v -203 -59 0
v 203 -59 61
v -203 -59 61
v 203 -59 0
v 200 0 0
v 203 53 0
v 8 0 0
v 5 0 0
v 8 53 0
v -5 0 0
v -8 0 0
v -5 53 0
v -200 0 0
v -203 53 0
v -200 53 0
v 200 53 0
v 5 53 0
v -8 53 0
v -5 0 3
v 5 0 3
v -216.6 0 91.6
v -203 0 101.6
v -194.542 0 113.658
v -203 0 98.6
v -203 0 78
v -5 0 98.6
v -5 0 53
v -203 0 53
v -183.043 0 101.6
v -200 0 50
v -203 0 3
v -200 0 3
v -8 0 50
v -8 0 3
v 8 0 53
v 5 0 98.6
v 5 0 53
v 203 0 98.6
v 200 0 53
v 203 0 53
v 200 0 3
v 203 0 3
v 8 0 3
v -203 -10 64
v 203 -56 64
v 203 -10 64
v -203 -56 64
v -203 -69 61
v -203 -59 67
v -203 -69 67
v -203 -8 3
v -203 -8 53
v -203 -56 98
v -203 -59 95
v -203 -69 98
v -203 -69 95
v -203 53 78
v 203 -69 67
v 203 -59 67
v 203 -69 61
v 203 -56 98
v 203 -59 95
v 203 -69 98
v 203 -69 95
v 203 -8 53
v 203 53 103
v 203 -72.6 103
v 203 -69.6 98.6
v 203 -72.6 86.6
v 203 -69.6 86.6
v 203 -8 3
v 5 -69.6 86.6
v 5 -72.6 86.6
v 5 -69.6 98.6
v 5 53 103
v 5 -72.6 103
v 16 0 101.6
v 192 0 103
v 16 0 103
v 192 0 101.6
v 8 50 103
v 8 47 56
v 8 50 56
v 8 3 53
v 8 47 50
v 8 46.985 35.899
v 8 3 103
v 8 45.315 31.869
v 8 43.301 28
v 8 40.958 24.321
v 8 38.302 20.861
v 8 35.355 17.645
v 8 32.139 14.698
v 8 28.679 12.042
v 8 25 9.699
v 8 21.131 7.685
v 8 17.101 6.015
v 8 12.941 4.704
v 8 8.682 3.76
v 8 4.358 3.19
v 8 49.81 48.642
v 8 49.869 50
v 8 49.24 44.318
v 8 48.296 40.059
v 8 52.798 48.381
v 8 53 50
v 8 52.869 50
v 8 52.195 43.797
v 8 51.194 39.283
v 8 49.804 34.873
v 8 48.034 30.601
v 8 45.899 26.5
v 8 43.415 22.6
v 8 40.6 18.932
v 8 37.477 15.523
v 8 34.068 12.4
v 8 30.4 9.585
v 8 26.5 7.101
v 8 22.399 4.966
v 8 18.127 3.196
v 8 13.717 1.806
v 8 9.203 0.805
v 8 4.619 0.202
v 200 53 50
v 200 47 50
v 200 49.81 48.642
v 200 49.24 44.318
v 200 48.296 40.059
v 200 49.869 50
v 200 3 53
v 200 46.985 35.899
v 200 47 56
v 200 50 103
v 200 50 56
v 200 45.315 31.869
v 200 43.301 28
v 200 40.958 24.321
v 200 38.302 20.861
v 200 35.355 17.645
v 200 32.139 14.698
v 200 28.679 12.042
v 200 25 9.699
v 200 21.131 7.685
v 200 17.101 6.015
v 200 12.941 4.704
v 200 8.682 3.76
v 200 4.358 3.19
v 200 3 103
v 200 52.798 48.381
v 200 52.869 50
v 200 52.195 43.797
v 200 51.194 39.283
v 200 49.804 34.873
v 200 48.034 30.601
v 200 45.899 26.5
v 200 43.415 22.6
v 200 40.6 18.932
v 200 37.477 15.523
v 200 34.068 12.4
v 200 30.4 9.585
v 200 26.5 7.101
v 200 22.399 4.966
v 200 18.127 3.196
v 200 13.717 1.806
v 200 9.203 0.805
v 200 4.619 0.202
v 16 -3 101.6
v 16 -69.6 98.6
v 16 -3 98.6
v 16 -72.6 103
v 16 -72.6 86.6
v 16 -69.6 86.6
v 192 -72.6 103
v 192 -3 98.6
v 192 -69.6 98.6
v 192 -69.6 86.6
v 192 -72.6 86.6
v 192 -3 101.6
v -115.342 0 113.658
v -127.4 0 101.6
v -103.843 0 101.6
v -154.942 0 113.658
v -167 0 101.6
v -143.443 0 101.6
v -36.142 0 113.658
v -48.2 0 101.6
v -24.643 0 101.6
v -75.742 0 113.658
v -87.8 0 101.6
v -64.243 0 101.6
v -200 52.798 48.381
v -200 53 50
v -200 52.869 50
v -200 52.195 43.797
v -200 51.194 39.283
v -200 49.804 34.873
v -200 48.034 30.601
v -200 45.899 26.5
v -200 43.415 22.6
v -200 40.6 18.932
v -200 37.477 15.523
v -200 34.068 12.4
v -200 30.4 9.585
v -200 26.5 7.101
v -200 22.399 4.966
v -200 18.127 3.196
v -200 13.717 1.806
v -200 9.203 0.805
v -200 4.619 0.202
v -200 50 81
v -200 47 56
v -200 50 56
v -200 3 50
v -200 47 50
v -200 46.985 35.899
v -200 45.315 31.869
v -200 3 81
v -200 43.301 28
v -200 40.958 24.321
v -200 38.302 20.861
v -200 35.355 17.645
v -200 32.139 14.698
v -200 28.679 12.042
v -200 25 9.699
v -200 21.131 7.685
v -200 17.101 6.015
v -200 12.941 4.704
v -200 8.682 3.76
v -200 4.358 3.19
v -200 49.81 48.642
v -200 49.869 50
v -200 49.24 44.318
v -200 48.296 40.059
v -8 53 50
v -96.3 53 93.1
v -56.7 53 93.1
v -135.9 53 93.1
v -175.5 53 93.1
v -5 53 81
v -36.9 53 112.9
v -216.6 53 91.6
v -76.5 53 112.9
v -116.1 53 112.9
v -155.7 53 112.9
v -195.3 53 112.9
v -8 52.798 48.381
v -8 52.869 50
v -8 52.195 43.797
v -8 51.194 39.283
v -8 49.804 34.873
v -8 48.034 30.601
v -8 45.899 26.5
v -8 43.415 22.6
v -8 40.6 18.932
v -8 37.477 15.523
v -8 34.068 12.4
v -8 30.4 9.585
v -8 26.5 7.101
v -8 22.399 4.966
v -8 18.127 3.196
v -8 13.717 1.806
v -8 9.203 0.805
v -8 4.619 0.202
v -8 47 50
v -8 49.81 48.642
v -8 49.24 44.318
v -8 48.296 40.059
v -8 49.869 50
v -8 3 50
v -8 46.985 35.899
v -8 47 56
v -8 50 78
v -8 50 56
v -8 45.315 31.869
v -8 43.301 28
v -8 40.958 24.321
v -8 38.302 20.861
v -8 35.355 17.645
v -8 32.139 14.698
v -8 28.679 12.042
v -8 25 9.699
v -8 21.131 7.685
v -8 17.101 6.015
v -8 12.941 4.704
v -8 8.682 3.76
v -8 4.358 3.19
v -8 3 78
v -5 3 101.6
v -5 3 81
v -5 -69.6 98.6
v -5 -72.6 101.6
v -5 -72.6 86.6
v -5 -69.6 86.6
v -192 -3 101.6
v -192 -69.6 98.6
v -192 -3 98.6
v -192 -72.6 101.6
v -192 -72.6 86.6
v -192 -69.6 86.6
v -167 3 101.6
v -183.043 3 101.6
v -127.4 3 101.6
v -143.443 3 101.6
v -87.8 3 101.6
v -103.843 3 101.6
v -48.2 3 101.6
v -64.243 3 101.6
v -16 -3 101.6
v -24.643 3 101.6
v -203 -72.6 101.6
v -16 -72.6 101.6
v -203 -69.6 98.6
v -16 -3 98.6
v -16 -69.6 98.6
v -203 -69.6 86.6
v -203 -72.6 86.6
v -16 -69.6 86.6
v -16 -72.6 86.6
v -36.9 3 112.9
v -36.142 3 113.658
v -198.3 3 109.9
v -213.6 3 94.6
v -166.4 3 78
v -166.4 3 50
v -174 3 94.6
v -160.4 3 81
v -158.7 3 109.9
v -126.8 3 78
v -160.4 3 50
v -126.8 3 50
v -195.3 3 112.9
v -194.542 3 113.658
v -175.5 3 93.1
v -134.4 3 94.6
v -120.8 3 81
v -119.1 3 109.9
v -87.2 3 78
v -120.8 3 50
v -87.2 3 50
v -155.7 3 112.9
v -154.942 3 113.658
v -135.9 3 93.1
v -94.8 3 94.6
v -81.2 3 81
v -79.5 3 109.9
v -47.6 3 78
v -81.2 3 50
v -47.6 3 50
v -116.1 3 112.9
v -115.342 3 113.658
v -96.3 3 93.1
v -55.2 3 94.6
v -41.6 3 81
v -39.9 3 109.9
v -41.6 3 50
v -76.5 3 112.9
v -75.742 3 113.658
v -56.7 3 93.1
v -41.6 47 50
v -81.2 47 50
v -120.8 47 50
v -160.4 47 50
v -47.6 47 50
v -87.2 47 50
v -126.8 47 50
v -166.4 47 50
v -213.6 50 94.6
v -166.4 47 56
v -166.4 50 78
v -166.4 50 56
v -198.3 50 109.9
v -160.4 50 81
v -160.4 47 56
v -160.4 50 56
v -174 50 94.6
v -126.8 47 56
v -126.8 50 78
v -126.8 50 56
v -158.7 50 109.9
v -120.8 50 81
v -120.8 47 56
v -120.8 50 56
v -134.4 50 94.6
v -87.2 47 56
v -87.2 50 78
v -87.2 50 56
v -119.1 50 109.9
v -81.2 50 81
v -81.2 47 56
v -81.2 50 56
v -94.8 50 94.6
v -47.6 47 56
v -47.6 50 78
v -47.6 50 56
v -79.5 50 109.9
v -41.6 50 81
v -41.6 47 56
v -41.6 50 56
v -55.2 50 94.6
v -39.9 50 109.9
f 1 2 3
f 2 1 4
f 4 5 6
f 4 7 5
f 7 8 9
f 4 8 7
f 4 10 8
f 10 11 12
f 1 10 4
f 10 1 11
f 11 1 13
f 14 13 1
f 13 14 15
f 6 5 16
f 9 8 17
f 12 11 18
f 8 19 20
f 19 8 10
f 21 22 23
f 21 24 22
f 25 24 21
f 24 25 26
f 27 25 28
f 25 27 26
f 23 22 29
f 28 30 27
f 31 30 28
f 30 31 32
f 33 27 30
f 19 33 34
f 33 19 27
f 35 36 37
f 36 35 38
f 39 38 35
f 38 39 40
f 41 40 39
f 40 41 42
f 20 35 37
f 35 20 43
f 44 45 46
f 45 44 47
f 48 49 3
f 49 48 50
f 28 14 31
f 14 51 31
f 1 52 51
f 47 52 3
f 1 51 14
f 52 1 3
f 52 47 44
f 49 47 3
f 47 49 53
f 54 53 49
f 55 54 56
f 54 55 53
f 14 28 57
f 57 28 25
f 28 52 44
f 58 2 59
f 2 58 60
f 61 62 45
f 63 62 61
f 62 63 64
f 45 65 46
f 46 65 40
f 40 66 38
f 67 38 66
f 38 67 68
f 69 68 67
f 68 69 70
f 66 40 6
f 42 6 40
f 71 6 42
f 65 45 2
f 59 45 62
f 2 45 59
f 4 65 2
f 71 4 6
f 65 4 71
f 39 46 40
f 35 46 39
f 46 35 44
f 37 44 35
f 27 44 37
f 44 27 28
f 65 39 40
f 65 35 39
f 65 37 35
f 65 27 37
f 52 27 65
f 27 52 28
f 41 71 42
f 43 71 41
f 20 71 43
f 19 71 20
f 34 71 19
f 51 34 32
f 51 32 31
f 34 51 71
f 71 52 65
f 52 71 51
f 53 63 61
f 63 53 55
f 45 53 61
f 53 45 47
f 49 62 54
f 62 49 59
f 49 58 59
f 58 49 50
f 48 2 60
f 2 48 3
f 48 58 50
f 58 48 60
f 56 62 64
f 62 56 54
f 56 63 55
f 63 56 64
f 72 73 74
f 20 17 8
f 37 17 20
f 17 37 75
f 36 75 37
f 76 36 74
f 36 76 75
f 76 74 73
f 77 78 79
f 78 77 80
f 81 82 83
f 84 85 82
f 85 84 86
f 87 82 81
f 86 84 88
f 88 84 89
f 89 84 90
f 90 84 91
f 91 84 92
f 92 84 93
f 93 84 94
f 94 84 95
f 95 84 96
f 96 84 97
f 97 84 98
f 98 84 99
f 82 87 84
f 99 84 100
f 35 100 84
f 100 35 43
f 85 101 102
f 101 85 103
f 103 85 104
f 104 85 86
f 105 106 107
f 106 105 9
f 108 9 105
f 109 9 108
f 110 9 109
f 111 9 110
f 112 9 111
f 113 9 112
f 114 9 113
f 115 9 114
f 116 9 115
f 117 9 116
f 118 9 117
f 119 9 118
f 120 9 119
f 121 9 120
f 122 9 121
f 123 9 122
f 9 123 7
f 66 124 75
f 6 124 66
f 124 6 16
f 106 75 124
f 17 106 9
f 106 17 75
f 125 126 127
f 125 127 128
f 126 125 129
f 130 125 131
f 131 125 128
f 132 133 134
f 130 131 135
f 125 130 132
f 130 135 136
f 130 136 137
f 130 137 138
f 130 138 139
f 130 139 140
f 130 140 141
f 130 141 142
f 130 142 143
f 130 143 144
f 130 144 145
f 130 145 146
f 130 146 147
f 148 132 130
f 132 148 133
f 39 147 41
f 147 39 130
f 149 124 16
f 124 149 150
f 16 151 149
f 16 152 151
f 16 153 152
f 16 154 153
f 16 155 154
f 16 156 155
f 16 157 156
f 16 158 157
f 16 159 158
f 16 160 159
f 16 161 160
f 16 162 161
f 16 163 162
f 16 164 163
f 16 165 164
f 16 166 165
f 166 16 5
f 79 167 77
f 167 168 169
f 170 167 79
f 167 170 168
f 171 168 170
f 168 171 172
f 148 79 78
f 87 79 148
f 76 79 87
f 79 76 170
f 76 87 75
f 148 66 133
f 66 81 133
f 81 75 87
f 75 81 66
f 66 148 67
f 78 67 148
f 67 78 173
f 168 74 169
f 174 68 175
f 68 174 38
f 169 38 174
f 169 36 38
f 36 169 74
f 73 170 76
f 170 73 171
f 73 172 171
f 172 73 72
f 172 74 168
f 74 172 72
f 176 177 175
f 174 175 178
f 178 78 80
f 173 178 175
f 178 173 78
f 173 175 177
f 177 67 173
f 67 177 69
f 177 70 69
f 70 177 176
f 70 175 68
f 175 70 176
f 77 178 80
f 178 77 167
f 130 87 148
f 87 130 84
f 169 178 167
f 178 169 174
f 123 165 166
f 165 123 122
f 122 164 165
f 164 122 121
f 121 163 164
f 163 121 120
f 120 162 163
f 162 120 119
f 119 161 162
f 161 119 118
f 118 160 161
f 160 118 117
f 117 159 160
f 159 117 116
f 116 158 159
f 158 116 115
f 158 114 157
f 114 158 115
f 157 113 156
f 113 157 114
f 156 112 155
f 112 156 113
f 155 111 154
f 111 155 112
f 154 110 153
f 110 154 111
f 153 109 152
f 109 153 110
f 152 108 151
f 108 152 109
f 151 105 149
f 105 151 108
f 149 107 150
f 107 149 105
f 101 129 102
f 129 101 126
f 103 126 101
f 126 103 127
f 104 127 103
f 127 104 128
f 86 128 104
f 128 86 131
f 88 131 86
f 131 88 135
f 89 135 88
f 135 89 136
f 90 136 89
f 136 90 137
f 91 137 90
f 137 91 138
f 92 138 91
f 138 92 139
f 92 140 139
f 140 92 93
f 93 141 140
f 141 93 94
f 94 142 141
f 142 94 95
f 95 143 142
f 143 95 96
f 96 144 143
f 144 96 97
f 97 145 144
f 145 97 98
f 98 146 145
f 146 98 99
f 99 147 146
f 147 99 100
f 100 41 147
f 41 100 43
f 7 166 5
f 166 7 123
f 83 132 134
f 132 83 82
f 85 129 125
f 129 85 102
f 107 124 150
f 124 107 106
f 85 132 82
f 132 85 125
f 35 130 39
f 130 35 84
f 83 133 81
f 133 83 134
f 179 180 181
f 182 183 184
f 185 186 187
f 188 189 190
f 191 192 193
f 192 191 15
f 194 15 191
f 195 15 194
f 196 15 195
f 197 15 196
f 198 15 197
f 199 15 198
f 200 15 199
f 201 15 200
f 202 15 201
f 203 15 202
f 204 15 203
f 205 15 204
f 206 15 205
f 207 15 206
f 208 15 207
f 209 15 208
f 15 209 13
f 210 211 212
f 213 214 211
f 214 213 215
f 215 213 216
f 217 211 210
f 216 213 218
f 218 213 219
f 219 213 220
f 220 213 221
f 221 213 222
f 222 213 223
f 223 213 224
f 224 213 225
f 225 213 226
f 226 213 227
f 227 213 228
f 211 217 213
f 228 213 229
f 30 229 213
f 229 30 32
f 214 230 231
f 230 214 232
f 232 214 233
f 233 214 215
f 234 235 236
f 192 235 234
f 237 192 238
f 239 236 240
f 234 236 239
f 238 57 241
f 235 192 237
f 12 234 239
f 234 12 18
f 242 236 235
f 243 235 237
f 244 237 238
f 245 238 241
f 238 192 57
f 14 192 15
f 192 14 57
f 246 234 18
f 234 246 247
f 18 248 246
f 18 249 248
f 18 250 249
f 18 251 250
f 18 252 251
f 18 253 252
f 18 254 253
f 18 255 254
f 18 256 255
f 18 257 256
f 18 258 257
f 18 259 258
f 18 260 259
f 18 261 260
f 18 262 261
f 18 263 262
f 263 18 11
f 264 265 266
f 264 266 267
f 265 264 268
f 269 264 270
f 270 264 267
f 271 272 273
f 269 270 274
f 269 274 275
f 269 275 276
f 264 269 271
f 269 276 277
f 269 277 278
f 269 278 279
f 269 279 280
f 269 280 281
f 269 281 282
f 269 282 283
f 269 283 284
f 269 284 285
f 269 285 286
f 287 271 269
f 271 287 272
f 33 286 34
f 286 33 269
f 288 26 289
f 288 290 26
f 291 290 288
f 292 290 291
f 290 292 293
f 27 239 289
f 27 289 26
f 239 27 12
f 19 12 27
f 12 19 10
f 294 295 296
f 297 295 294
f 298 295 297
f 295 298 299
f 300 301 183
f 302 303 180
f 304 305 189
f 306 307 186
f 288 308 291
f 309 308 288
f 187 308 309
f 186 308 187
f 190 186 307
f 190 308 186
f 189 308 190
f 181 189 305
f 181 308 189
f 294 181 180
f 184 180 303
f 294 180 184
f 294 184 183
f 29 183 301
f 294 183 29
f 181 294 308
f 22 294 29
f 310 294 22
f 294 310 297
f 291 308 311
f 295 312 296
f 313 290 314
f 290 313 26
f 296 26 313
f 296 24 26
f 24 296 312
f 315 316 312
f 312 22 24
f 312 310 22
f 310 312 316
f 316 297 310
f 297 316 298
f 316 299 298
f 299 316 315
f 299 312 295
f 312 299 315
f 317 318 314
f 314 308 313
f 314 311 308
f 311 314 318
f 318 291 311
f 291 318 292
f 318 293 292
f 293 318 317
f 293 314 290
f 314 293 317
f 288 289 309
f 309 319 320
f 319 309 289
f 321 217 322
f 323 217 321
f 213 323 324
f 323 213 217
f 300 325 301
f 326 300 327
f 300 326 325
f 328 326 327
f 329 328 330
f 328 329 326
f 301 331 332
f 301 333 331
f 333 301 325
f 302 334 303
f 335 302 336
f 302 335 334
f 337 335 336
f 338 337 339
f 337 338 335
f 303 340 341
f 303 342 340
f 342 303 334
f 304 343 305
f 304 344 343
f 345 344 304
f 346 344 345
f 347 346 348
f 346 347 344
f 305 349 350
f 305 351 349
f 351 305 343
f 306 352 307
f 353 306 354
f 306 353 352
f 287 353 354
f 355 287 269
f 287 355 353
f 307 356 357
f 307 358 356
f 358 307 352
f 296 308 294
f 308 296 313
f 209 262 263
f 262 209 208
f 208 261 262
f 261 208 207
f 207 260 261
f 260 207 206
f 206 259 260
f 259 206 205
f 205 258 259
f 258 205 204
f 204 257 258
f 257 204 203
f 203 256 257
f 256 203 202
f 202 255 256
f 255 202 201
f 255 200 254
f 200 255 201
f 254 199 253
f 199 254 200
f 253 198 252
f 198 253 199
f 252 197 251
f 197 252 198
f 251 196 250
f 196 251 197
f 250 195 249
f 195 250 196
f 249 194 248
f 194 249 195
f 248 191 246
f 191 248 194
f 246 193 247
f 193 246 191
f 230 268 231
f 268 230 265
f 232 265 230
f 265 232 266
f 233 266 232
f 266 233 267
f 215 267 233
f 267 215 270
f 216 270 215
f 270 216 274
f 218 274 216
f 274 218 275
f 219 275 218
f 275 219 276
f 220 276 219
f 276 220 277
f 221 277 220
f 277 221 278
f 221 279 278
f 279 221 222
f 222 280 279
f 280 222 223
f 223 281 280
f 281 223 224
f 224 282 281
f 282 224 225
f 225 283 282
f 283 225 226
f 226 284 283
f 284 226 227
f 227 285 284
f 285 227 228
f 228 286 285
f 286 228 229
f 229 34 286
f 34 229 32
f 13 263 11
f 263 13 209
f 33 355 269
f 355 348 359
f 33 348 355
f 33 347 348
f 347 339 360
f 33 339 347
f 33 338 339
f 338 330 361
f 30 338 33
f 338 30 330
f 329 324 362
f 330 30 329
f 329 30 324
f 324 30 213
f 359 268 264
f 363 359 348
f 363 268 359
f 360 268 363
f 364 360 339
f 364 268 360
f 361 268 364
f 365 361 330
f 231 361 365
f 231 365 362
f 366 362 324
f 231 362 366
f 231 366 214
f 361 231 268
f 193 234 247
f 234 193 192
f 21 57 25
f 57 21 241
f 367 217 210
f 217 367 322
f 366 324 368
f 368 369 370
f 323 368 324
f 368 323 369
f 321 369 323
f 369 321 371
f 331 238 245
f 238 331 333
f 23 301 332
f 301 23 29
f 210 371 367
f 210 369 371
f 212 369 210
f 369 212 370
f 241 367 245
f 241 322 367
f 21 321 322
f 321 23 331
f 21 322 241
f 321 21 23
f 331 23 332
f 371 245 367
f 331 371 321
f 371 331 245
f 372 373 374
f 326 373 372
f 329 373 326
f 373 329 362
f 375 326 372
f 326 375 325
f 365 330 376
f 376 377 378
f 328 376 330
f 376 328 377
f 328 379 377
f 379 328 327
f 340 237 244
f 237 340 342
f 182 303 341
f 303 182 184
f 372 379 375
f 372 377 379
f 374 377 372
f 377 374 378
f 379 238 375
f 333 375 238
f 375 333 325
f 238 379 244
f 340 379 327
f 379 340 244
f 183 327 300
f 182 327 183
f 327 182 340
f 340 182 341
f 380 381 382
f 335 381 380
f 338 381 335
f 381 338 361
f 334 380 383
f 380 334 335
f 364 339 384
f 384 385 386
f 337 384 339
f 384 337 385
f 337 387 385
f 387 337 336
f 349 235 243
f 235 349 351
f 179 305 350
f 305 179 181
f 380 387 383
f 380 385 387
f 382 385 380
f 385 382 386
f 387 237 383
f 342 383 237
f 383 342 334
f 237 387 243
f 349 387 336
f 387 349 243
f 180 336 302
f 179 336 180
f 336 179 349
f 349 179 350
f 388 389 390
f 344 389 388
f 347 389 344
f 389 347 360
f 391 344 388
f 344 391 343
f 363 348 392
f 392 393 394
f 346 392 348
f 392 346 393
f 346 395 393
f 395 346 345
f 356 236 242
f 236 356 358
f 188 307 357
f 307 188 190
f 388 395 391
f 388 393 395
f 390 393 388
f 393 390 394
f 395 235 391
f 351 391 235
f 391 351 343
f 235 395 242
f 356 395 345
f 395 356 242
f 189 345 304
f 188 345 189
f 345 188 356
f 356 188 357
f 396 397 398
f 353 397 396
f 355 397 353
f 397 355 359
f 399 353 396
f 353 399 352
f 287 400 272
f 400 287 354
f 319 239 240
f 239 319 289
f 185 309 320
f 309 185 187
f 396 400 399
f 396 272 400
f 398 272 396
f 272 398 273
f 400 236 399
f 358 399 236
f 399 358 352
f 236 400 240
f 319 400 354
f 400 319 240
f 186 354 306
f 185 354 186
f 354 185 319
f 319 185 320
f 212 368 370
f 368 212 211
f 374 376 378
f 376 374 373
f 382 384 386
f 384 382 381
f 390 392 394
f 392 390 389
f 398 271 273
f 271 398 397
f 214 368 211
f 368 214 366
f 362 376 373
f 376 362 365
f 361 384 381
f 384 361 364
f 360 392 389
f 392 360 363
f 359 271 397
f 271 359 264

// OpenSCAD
// file: parts/ac_vent_rail_mockup.scad
// Reference-only mockup of the measured AC vent, top ledge, and mounting rail.
// This artifact is an interface/checking aid, not a replacement appliance part.

module _validate_ac_mockup_parameters() {
  assert(
    mockup_vent_width > 0,
    "Mockup vent width must be positive."
  );
  assert(
    mockup_clear_outlet_height > 0
      && mockup_clear_outlet_height
        < ac_inlet_lower_datum_to_rail_base,
    "Clear outlet must fit below the measured AC top datum."
  );
  assert(
    mockup_vent_face_to_rail_front
      >= mockup_outlet_recess_depth + rail_depth,
    "Measured ledge depth cannot contain the outlet recess and rail."
  );
  assert(
    mockup_casing_skin >= minimum_wall_thickness,
    "Mockup casing skin is below the structural modeling minimum."
  );
  assert(
    rail_thickness >= minimum_wall_thickness,
    "Mockup rail thickness is below the structural modeling minimum."
  );
}

module _mockup_casing() {
  lower_datum_z = 0;
  outlet_bottom_z = wall_thickness;
  outlet_top_z =
    outlet_bottom_z + mockup_clear_outlet_height;
  casing_top_z = ac_inlet_lower_datum_to_rail_base;
  back_y =
    -mockup_vent_face_to_rail_front
    - rail_thickness;

  difference() {
    // The sloped upper face approximates the photographed molded outlet hood.
    rotate([0, -90, 0])
      linear_extrude(
        height = mockup_vent_width,
        center = true,
        convexity = 10
      )
        polygon(points = [
          [lower_datum_z, back_y],
          [lower_datum_z, 0],
          [outlet_top_z, 0],
          [casing_top_z, -10],
          [casing_top_z, back_y]
        ]);

    // Shallow open-front recess marks the measured 406 x 50 mm airflow area.
    translate([
      -mockup_vent_width / 2 - 1,
      -mockup_outlet_recess_depth,
      outlet_bottom_z
    ])
      cube([
        mockup_vent_width + 2,
        mockup_outlet_recess_depth + 1,
        mockup_clear_outlet_height
      ]);
  }
}

module _mockup_rail() {
  rail_front_y = -mockup_vent_face_to_rail_front;
  rail_base_z = ac_inlet_lower_datum_to_rail_base;

  union() {
    // Vertical flange.
    translate([
      -mockup_vent_width / 2,
      rail_front_y - rail_thickness,
      rail_base_z
    ])
      cube([
        mockup_vent_width,
        rail_thickness,
        rail_flange_height
      ]);

    // Lower mounting foot and upper rolled-lip envelope extend rearward,
    // toward the wood side of the installation. The 10 mm depths are
    // assumptions retained from the original prompt, not direct photo reads.
    translate([
      -mockup_vent_width / 2,
      rail_front_y
        - mockup_rail_lip_depth
        - rail_thickness,
      rail_base_z - rail_thickness
    ])
      cube([
        mockup_vent_width,
        mockup_rail_lip_depth + rail_thickness,
        2 * rail_thickness
      ]);

    translate([
      -mockup_vent_width / 2,
      rail_front_y
        - mockup_rail_lip_depth
        - rail_thickness,
      rail_top_z - rail_thickness
    ])
      cube([
        mockup_vent_width,
        mockup_rail_lip_depth + rail_thickness,
        rail_thickness
      ]);
  }
}

module ac_vent_rail_mockup() {
  _validate_ac_mockup_parameters();

  union() {
    _mockup_casing();
    _mockup_rail();
  }
}
// file: lib/defaults.scad
// AC redirector prototype defaults, revision 0001 (all dimensions in mm).
//
// Installed coordinate convention:
// - x: across the AC outlet; positive x is the provisional bedward yaw direction
// - y: forward, away from the AC face
// - z: upward from the bottom tangent of the scoop

minimum_wall_thickness = 3.0;
minimum_structural_overlap = minimum_wall_thickness;
minimum_internal_edge_width = minimum_wall_thickness;
numeric_tolerance = 0.001;

part_id = 0;

total_outlet_width = 406.0;
piece_width = 198.0;
center_gap = 10.0;
outlet_height = 50.0;

wall_thickness = 3.0;
end_wall_thickness = 3.0;
turn_inner_radius = outlet_height;
profile_arc_step = 5.0;

// Provisional rail profile. Confirm with a fit coupon before fabrication.
rail_thickness = 3.0;
rail_depth = 10.0;
rail_face_setback = 56.0;
hook_clearance = 0.6;
hook_engagement = 12.0;
hook_band_width = 11.0;
left_hook_x = -piece_width / 2;
right_hook_x = piece_width / 2 - hook_band_width;
// Photo-derived provisional installation datums. The close-up caliper photos
// indicate approximately 64 mm from the lower vent datum to the AC top /
// flange base, followed by approximately 34 mm of vertical flange rise.
ac_inlet_lower_datum_to_rail_base = 64.0;
rail_flange_height = 34.0;
rail_top_z = ac_inlet_lower_datum_to_rail_base + rail_flange_height;

// Reference mockup dimensions. Clear outlet height and total width came from
// the original measured prompt; housing/rail datums are read from the photos.
mockup_vent_width = total_outlet_width;
mockup_clear_outlet_height = outlet_height;
mockup_vent_face_to_rail_front = rail_face_setback;
mockup_casing_skin = wall_thickness;
mockup_outlet_recess_depth = 8.0;
mockup_rail_lip_depth = rail_depth;

side_wall_outlet_rise = 20.0;
top_duct_height = turn_inner_radius;

bed_yaw_degrees = 45.0;
bed_yaw_sign = -1;
bed_duct_count = 5;

maximum_print_dimension = 220.0;

// Named structural engagement dimensions.
scoop_end_wall_overlap = end_wall_thickness;
end_wall_mounting_wall_overlap = wall_thickness;
hook_spine_overlap = wall_thickness;
spine_mounting_wall_overlap = wall_thickness;
door_guide_scoop_overlap = minimum_structural_overlap;
bed_root_scoop_overlap = minimum_structural_overlap;
bed_vane_root_overlap = wall_thickness;
bed_lower_end_wall_duct_overlap = bed_root_scoop_overlap;
top_duct_corner_overlap = wall_thickness;
top_duct_root_shell_overlap = minimum_structural_overlap;

// Derived installed envelope.
hook_back_y =
  -(
    rail_face_setback
    + rail_depth
    + rail_thickness
    + hook_clearance
    + wall_thickness
  );
turn_front_y = turn_inner_radius + wall_thickness;
turn_end_z = turn_inner_radius + wall_thickness;
hook_bridge_bottom_z = rail_top_z + hook_clearance;
hook_bridge_top_z = hook_bridge_bottom_z + wall_thickness;
hook_drop_bottom_z = hook_bridge_bottom_z - hook_engagement;
hook_bridge_front_y = 0;
mounting_wall_back_y = 0;
mounting_wall_depth = wall_thickness;
alignment_spine_back_y = -wall_thickness;
alignment_spine_depth = 2 * wall_thickness;
rail_front_y = -rail_face_setback;
rail_rear_y =
  rail_front_y - rail_depth - rail_thickness;
hook_rear_drop_front_y = hook_back_y + wall_thickness;
hook_vertical_clearance =
  hook_bridge_bottom_z - rail_top_z;
hook_rear_clearance =
  rail_rear_y - hook_rear_drop_front_y;
hook_usable_rail_depth = rail_depth + hook_clearance;
hook_total_rearward_reach =
  -hook_back_y;
hook_footprint_min_x = left_hook_x;
hook_footprint_max_x = right_hook_x + hook_band_width;
ac_inlet_bottom_z = wall_thickness;
ac_inlet_top_z = turn_end_z;
ac_inlet_clear_height =
  ac_inlet_top_z - ac_inlet_bottom_z;
hook_top_above_ac_inlet =
  hook_bridge_top_z - ac_inlet_top_z;
side_wall_top_z = turn_end_z + side_wall_outlet_rise;
bed_sweep_height =
  min(
    top_duct_height,
    (maximum_print_dimension - piece_width)
      / tan(bed_yaw_degrees)
  );
bed_vane_shift =
  bed_sweep_height * tan(bed_yaw_degrees);
bed_vertical_rise =
  top_duct_height - bed_sweep_height;
bed_duct_collective_span = piece_width;
bed_duct_width =
  bed_duct_collective_span / bed_duct_count;
bed_outlet_cut_extension = bed_duct_width;
bed_top_z =
  turn_end_z - bed_root_scoop_overlap
  + top_duct_height
  + wall_thickness;
door_top_z = bed_top_z;
door_hook_bridge_top_z = door_top_z;
door_hook_bridge_height =
  door_hook_bridge_top_z - hook_bridge_bottom_z;

installed_size_x = piece_width + abs(bed_vane_shift);
installed_size_y = turn_front_y - hook_back_y;
installed_size_z = max(
  door_top_z,
  bed_top_z,
  side_wall_top_z,
  hook_bridge_top_z,
  door_hook_bridge_top_z
);
// main file
// Scripted export entry point.
// part_id map:
// 0 = two-part assembly preview
// 1 = door-side redirector
// 2 = bed-side redirector
// 3 = measured AC vent-and-rail reference mockup

include <lib/defaults.scad>;
include <parts/ac_redirectors.scad>;
include <parts/ac_vent_rail_mockup.scad>;

_part_id = is_undef(part_id) ? 0 : part_id;

if (_part_id == 0) {
  ac_redirectors_preview();
} else if (_part_id == 1) {
  door_side_redirector();
} else if (_part_id == 2) {
  bed_side_redirector();
} else if (_part_id == 3) {
  ac_vent_rail_mockup();
} else {
  assert(false, str("Unknown part_id: ", _part_id));
}
